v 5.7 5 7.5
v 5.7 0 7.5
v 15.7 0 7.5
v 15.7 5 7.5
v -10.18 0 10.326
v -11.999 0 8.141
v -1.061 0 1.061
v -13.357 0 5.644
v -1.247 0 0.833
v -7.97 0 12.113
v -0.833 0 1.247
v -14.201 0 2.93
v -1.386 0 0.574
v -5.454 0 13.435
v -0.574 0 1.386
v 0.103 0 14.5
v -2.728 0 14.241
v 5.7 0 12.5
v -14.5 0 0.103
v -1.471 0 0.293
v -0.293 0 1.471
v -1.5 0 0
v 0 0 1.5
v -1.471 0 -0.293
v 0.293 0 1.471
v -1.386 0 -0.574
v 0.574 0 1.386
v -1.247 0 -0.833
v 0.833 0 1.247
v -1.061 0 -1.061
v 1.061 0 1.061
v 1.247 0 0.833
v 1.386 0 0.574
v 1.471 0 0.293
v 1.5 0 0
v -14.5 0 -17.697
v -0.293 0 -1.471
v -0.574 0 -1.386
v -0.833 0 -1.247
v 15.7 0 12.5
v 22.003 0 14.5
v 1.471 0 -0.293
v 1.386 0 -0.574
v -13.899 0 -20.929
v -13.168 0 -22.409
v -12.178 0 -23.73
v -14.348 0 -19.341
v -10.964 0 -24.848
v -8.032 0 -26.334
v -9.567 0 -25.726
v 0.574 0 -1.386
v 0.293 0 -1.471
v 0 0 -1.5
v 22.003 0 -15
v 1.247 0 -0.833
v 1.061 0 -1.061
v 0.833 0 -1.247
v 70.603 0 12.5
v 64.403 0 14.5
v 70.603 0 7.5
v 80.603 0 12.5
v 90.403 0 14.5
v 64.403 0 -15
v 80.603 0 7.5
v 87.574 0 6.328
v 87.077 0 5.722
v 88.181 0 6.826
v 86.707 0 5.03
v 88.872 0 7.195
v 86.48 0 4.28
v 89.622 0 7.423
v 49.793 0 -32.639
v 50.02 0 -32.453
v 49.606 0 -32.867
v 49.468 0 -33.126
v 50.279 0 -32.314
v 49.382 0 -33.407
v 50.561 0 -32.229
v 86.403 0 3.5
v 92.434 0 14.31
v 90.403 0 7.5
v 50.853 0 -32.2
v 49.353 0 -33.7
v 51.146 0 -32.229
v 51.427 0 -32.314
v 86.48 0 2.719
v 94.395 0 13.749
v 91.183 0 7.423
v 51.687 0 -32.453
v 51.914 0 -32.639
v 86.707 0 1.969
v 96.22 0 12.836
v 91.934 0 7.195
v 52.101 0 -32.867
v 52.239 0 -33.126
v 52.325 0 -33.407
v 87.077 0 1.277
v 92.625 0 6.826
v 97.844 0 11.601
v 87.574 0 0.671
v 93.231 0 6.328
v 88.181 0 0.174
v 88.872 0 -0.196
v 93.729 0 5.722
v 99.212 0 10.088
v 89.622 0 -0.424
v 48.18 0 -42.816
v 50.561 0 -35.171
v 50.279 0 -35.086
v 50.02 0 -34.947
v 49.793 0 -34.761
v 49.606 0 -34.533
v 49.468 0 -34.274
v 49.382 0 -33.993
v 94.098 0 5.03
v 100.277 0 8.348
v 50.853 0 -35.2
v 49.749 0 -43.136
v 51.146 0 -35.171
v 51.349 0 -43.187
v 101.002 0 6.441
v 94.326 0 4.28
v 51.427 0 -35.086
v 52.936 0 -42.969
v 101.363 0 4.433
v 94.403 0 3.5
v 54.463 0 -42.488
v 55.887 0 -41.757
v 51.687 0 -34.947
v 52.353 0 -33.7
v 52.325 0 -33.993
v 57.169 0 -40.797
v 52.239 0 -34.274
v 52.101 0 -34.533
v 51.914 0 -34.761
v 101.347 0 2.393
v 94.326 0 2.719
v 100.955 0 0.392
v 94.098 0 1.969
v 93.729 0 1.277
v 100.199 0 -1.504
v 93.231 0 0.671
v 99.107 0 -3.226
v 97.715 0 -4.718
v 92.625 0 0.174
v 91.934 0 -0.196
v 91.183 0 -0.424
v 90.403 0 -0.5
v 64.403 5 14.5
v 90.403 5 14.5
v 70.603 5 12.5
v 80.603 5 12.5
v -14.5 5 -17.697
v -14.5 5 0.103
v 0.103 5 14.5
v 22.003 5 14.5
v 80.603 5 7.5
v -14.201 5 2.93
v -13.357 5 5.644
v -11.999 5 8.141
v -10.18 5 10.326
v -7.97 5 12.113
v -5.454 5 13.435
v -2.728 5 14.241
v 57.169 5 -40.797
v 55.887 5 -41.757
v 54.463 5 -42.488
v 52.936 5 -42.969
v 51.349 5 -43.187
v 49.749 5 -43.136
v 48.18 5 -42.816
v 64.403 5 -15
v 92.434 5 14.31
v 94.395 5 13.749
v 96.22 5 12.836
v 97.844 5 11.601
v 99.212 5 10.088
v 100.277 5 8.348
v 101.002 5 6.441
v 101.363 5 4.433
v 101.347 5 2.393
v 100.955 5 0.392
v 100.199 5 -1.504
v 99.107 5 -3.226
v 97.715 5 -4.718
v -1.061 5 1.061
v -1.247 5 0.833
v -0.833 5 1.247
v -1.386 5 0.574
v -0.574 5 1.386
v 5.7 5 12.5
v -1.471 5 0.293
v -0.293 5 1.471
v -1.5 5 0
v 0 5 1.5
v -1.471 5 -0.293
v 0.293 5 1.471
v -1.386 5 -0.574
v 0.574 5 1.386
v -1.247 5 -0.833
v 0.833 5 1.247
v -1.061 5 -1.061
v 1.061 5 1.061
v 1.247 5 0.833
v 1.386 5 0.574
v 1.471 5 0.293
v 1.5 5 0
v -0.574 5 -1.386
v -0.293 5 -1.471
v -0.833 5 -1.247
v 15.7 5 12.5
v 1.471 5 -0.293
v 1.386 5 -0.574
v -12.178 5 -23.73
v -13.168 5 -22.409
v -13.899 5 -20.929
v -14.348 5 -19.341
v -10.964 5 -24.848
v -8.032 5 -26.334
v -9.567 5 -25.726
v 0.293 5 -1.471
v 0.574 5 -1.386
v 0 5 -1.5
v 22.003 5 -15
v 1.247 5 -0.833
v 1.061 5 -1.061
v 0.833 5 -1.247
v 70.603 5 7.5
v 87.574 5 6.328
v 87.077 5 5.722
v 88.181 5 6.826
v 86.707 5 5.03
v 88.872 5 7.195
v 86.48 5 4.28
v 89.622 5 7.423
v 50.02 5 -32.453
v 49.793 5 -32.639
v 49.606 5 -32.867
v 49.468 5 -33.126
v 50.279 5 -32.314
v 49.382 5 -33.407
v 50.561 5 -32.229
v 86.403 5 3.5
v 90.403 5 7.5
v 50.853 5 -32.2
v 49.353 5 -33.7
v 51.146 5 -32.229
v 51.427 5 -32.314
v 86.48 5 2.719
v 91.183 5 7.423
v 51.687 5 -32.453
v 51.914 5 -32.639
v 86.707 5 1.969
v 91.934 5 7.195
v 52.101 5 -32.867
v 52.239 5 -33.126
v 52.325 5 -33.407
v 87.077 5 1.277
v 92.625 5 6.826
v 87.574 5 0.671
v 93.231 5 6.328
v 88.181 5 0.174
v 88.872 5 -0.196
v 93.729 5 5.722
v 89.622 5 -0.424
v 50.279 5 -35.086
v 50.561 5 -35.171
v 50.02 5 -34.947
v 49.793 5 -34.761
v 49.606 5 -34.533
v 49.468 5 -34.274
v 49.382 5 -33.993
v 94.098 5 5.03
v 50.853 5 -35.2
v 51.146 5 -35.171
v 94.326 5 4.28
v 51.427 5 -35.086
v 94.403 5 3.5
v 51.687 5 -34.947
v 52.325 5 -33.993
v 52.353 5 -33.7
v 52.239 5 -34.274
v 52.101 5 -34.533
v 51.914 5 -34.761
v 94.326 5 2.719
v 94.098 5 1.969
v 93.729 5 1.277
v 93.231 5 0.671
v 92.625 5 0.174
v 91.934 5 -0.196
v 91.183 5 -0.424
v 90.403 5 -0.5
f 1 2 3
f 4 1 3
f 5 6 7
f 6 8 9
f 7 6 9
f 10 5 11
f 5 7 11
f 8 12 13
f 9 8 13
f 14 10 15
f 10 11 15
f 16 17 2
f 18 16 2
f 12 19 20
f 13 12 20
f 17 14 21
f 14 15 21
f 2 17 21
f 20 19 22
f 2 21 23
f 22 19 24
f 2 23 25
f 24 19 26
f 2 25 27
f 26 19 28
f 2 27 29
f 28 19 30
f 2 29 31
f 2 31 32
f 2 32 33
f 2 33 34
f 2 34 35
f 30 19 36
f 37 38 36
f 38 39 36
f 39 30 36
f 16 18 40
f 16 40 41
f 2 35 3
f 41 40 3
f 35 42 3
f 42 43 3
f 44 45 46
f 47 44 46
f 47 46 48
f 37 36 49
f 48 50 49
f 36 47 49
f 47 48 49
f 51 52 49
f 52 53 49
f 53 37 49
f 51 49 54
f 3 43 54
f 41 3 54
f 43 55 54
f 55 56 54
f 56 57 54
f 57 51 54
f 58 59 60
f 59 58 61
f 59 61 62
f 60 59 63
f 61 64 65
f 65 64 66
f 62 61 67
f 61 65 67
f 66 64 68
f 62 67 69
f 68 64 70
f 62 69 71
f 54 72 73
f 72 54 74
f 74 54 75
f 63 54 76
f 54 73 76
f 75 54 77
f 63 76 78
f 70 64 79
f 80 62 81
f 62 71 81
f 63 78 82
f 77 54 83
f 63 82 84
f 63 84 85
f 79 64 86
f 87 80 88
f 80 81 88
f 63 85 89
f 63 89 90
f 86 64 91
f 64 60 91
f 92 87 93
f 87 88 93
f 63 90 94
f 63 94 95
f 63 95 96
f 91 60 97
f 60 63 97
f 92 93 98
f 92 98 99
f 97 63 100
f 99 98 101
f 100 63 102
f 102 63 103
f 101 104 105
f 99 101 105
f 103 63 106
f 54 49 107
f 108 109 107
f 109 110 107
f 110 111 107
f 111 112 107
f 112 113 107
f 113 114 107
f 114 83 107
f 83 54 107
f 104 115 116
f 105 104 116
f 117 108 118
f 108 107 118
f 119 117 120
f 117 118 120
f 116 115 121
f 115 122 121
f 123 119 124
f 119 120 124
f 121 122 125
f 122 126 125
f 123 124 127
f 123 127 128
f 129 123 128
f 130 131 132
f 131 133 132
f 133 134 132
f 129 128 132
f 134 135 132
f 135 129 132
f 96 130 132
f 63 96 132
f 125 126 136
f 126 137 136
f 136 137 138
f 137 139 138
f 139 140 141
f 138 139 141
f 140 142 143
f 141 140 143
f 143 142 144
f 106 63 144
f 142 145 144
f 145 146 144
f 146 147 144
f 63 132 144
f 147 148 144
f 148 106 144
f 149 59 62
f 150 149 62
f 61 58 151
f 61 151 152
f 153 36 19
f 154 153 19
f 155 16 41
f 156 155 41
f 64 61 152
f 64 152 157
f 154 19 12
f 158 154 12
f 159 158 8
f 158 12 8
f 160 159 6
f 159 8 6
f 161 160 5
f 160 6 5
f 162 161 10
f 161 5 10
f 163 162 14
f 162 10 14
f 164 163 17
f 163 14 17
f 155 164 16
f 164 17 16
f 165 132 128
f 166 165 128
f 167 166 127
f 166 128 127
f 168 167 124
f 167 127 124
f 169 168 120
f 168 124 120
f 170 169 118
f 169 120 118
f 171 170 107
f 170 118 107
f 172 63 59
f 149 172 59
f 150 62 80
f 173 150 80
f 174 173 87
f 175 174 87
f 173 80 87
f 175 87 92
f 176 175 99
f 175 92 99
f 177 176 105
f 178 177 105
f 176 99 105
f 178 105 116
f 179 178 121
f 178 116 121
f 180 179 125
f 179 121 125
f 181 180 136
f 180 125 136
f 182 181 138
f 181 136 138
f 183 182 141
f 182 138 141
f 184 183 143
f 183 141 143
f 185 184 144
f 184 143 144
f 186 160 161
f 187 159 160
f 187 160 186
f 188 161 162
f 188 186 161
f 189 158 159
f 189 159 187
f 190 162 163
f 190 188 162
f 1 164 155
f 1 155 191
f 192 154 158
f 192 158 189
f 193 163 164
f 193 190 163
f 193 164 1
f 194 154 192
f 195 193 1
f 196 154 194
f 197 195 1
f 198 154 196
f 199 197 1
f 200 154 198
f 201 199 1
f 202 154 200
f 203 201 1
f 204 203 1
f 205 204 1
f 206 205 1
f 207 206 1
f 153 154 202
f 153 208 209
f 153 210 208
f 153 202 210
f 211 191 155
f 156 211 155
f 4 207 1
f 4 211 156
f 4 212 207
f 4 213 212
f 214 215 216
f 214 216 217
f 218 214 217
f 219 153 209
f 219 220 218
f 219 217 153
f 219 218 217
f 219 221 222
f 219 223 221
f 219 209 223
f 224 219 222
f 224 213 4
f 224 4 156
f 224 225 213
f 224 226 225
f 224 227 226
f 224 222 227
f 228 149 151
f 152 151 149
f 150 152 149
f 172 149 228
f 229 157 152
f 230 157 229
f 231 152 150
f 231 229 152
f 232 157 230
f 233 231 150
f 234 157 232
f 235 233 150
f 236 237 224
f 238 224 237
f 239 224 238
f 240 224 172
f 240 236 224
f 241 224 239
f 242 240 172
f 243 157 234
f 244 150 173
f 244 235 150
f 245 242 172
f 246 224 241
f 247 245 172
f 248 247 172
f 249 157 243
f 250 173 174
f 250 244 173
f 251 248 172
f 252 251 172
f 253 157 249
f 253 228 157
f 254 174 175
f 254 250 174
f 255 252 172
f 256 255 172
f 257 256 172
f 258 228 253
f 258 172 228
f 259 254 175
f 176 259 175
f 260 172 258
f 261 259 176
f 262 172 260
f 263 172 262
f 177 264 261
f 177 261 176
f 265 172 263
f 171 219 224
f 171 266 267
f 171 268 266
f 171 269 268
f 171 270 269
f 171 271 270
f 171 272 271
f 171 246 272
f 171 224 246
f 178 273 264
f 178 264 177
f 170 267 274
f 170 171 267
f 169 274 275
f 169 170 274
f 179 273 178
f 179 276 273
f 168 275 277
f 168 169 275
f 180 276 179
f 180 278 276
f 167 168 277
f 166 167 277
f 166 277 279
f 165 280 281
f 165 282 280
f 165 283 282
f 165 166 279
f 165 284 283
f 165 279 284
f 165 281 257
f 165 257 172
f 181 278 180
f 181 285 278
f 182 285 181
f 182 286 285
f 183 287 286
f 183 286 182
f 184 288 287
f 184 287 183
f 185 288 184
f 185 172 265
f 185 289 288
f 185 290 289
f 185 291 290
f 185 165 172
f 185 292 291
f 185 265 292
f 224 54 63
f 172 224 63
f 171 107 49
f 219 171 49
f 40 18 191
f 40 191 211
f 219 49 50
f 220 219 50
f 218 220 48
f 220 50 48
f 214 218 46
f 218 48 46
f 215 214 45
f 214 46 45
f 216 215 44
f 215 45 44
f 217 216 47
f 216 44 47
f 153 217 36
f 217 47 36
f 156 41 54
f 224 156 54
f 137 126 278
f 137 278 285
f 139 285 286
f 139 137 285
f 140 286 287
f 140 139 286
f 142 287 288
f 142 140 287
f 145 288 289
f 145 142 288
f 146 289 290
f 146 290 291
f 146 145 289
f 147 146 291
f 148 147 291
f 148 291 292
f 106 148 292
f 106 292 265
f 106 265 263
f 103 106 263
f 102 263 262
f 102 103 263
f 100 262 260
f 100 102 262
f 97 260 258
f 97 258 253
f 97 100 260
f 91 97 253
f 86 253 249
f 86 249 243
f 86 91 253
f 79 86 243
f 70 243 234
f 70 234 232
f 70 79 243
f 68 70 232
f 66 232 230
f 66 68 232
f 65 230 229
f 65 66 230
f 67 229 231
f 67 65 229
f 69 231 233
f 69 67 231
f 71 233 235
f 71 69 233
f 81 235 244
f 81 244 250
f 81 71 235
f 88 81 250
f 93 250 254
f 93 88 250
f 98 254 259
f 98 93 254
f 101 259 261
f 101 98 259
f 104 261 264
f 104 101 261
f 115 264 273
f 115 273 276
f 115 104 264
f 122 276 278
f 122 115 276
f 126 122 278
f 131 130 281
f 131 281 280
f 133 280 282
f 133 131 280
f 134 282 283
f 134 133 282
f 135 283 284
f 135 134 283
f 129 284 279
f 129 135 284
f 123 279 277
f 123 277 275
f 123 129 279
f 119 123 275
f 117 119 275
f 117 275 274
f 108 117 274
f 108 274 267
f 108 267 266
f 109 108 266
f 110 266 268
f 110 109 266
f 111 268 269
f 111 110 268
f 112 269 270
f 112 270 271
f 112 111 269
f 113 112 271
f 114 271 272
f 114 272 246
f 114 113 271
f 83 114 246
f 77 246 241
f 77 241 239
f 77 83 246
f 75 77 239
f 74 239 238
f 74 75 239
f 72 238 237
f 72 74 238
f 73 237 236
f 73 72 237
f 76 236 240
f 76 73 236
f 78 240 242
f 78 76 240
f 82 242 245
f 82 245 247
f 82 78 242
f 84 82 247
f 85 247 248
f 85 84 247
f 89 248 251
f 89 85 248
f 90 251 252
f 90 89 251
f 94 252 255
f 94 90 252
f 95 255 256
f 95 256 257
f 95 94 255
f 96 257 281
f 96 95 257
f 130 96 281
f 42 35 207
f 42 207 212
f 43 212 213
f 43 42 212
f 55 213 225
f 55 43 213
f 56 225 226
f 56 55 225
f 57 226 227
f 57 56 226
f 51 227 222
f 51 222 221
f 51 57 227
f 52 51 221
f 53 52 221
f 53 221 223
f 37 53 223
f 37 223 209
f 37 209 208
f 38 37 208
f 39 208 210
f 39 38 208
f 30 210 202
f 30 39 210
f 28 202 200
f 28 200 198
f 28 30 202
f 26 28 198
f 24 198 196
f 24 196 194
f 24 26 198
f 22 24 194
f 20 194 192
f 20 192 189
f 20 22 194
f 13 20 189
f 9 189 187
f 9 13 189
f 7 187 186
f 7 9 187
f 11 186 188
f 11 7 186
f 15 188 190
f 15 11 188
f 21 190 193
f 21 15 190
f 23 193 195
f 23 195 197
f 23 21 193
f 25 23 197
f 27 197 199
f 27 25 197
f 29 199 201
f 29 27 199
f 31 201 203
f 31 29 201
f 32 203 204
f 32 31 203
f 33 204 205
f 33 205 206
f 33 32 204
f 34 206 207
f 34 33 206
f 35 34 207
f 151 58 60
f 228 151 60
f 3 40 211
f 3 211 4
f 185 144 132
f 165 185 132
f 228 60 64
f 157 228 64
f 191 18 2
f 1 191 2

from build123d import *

# Parameters (mm, degrees)
SKETCH1_R           = 1.5
SKETCH1_R_2         = 4
SKETCH1_W           = 10
SKETCH1_H           = 5
BOSS_EXTRUDE1_DEPTH = 5


with BuildPart() as part:
    # Sketch1 → Boss-Extrude1 (new body)
    with BuildSketch(Plane(origin=(0, 0, 0), x_dir=(1, 0, 0), z_dir=(0, 1, 0))):
        with BuildLine():
            Line((0.102834293, -14.499635344), (22.002834293, -14.499635344))
            Line((22.002834293, -14.499635344), (22.002834293, 15.000364656))
            Line((22.002834293, 15.000364656), (64.402834293, 15.000364656))
            Line((64.402834293, 15.000364656), (64.402834293, -14.499635344))
            Line((64.402834293, -14.499635344), (90.402834293, -14.499635344))
            ThreePointArc((90.402834293, -14.499635344), (100.683758076, -7.411489913), (97.715103143, 4.718072625))
            Line((97.715103143, 4.718072625), (57.168590047, 40.797111428))
            ThreePointArc((57.168590047, 40.797111428), (52.935602616, 42.969014799), (48.180396076, 42.816182826))
            Line((48.180396076, 42.816182826), (-8.032001051, 26.333549436))
            ThreePointArc((-8.032001051, 26.333549436), (-12.703498591, 23.092010868), (-14.499635344, 17.697165707))
            Line((-14.499635344, 17.697165707), (-14.499635344, -0.102834293))
            ThreePointArc((-14.499635344, -0.102834293), (-10.18007565, -10.325505303), (0.102834293, -14.499635344))
        make_face()
        Circle(SKETCH1_R, mode=Mode.SUBTRACT)
        with Locations((90.402834293, -3.499635344)):
            Circle(SKETCH1_R_2, mode=Mode.SUBTRACT)
        with Locations((50.853448768, 33.7)):
            Circle(SKETCH1_R, mode=Mode.SUBTRACT)
        with Locations((10.7, -9.999635344)):
            Rectangle(SKETCH1_W, SKETCH1_H, mode=Mode.SUBTRACT)
        with Locations((75.602834293, -9.999635344)):
            Rectangle(SKETCH1_W, SKETCH1_H, mode=Mode.SUBTRACT)
    extrude(amount=BOSS_EXTRUDE1_DEPTH)


solid = part.part
